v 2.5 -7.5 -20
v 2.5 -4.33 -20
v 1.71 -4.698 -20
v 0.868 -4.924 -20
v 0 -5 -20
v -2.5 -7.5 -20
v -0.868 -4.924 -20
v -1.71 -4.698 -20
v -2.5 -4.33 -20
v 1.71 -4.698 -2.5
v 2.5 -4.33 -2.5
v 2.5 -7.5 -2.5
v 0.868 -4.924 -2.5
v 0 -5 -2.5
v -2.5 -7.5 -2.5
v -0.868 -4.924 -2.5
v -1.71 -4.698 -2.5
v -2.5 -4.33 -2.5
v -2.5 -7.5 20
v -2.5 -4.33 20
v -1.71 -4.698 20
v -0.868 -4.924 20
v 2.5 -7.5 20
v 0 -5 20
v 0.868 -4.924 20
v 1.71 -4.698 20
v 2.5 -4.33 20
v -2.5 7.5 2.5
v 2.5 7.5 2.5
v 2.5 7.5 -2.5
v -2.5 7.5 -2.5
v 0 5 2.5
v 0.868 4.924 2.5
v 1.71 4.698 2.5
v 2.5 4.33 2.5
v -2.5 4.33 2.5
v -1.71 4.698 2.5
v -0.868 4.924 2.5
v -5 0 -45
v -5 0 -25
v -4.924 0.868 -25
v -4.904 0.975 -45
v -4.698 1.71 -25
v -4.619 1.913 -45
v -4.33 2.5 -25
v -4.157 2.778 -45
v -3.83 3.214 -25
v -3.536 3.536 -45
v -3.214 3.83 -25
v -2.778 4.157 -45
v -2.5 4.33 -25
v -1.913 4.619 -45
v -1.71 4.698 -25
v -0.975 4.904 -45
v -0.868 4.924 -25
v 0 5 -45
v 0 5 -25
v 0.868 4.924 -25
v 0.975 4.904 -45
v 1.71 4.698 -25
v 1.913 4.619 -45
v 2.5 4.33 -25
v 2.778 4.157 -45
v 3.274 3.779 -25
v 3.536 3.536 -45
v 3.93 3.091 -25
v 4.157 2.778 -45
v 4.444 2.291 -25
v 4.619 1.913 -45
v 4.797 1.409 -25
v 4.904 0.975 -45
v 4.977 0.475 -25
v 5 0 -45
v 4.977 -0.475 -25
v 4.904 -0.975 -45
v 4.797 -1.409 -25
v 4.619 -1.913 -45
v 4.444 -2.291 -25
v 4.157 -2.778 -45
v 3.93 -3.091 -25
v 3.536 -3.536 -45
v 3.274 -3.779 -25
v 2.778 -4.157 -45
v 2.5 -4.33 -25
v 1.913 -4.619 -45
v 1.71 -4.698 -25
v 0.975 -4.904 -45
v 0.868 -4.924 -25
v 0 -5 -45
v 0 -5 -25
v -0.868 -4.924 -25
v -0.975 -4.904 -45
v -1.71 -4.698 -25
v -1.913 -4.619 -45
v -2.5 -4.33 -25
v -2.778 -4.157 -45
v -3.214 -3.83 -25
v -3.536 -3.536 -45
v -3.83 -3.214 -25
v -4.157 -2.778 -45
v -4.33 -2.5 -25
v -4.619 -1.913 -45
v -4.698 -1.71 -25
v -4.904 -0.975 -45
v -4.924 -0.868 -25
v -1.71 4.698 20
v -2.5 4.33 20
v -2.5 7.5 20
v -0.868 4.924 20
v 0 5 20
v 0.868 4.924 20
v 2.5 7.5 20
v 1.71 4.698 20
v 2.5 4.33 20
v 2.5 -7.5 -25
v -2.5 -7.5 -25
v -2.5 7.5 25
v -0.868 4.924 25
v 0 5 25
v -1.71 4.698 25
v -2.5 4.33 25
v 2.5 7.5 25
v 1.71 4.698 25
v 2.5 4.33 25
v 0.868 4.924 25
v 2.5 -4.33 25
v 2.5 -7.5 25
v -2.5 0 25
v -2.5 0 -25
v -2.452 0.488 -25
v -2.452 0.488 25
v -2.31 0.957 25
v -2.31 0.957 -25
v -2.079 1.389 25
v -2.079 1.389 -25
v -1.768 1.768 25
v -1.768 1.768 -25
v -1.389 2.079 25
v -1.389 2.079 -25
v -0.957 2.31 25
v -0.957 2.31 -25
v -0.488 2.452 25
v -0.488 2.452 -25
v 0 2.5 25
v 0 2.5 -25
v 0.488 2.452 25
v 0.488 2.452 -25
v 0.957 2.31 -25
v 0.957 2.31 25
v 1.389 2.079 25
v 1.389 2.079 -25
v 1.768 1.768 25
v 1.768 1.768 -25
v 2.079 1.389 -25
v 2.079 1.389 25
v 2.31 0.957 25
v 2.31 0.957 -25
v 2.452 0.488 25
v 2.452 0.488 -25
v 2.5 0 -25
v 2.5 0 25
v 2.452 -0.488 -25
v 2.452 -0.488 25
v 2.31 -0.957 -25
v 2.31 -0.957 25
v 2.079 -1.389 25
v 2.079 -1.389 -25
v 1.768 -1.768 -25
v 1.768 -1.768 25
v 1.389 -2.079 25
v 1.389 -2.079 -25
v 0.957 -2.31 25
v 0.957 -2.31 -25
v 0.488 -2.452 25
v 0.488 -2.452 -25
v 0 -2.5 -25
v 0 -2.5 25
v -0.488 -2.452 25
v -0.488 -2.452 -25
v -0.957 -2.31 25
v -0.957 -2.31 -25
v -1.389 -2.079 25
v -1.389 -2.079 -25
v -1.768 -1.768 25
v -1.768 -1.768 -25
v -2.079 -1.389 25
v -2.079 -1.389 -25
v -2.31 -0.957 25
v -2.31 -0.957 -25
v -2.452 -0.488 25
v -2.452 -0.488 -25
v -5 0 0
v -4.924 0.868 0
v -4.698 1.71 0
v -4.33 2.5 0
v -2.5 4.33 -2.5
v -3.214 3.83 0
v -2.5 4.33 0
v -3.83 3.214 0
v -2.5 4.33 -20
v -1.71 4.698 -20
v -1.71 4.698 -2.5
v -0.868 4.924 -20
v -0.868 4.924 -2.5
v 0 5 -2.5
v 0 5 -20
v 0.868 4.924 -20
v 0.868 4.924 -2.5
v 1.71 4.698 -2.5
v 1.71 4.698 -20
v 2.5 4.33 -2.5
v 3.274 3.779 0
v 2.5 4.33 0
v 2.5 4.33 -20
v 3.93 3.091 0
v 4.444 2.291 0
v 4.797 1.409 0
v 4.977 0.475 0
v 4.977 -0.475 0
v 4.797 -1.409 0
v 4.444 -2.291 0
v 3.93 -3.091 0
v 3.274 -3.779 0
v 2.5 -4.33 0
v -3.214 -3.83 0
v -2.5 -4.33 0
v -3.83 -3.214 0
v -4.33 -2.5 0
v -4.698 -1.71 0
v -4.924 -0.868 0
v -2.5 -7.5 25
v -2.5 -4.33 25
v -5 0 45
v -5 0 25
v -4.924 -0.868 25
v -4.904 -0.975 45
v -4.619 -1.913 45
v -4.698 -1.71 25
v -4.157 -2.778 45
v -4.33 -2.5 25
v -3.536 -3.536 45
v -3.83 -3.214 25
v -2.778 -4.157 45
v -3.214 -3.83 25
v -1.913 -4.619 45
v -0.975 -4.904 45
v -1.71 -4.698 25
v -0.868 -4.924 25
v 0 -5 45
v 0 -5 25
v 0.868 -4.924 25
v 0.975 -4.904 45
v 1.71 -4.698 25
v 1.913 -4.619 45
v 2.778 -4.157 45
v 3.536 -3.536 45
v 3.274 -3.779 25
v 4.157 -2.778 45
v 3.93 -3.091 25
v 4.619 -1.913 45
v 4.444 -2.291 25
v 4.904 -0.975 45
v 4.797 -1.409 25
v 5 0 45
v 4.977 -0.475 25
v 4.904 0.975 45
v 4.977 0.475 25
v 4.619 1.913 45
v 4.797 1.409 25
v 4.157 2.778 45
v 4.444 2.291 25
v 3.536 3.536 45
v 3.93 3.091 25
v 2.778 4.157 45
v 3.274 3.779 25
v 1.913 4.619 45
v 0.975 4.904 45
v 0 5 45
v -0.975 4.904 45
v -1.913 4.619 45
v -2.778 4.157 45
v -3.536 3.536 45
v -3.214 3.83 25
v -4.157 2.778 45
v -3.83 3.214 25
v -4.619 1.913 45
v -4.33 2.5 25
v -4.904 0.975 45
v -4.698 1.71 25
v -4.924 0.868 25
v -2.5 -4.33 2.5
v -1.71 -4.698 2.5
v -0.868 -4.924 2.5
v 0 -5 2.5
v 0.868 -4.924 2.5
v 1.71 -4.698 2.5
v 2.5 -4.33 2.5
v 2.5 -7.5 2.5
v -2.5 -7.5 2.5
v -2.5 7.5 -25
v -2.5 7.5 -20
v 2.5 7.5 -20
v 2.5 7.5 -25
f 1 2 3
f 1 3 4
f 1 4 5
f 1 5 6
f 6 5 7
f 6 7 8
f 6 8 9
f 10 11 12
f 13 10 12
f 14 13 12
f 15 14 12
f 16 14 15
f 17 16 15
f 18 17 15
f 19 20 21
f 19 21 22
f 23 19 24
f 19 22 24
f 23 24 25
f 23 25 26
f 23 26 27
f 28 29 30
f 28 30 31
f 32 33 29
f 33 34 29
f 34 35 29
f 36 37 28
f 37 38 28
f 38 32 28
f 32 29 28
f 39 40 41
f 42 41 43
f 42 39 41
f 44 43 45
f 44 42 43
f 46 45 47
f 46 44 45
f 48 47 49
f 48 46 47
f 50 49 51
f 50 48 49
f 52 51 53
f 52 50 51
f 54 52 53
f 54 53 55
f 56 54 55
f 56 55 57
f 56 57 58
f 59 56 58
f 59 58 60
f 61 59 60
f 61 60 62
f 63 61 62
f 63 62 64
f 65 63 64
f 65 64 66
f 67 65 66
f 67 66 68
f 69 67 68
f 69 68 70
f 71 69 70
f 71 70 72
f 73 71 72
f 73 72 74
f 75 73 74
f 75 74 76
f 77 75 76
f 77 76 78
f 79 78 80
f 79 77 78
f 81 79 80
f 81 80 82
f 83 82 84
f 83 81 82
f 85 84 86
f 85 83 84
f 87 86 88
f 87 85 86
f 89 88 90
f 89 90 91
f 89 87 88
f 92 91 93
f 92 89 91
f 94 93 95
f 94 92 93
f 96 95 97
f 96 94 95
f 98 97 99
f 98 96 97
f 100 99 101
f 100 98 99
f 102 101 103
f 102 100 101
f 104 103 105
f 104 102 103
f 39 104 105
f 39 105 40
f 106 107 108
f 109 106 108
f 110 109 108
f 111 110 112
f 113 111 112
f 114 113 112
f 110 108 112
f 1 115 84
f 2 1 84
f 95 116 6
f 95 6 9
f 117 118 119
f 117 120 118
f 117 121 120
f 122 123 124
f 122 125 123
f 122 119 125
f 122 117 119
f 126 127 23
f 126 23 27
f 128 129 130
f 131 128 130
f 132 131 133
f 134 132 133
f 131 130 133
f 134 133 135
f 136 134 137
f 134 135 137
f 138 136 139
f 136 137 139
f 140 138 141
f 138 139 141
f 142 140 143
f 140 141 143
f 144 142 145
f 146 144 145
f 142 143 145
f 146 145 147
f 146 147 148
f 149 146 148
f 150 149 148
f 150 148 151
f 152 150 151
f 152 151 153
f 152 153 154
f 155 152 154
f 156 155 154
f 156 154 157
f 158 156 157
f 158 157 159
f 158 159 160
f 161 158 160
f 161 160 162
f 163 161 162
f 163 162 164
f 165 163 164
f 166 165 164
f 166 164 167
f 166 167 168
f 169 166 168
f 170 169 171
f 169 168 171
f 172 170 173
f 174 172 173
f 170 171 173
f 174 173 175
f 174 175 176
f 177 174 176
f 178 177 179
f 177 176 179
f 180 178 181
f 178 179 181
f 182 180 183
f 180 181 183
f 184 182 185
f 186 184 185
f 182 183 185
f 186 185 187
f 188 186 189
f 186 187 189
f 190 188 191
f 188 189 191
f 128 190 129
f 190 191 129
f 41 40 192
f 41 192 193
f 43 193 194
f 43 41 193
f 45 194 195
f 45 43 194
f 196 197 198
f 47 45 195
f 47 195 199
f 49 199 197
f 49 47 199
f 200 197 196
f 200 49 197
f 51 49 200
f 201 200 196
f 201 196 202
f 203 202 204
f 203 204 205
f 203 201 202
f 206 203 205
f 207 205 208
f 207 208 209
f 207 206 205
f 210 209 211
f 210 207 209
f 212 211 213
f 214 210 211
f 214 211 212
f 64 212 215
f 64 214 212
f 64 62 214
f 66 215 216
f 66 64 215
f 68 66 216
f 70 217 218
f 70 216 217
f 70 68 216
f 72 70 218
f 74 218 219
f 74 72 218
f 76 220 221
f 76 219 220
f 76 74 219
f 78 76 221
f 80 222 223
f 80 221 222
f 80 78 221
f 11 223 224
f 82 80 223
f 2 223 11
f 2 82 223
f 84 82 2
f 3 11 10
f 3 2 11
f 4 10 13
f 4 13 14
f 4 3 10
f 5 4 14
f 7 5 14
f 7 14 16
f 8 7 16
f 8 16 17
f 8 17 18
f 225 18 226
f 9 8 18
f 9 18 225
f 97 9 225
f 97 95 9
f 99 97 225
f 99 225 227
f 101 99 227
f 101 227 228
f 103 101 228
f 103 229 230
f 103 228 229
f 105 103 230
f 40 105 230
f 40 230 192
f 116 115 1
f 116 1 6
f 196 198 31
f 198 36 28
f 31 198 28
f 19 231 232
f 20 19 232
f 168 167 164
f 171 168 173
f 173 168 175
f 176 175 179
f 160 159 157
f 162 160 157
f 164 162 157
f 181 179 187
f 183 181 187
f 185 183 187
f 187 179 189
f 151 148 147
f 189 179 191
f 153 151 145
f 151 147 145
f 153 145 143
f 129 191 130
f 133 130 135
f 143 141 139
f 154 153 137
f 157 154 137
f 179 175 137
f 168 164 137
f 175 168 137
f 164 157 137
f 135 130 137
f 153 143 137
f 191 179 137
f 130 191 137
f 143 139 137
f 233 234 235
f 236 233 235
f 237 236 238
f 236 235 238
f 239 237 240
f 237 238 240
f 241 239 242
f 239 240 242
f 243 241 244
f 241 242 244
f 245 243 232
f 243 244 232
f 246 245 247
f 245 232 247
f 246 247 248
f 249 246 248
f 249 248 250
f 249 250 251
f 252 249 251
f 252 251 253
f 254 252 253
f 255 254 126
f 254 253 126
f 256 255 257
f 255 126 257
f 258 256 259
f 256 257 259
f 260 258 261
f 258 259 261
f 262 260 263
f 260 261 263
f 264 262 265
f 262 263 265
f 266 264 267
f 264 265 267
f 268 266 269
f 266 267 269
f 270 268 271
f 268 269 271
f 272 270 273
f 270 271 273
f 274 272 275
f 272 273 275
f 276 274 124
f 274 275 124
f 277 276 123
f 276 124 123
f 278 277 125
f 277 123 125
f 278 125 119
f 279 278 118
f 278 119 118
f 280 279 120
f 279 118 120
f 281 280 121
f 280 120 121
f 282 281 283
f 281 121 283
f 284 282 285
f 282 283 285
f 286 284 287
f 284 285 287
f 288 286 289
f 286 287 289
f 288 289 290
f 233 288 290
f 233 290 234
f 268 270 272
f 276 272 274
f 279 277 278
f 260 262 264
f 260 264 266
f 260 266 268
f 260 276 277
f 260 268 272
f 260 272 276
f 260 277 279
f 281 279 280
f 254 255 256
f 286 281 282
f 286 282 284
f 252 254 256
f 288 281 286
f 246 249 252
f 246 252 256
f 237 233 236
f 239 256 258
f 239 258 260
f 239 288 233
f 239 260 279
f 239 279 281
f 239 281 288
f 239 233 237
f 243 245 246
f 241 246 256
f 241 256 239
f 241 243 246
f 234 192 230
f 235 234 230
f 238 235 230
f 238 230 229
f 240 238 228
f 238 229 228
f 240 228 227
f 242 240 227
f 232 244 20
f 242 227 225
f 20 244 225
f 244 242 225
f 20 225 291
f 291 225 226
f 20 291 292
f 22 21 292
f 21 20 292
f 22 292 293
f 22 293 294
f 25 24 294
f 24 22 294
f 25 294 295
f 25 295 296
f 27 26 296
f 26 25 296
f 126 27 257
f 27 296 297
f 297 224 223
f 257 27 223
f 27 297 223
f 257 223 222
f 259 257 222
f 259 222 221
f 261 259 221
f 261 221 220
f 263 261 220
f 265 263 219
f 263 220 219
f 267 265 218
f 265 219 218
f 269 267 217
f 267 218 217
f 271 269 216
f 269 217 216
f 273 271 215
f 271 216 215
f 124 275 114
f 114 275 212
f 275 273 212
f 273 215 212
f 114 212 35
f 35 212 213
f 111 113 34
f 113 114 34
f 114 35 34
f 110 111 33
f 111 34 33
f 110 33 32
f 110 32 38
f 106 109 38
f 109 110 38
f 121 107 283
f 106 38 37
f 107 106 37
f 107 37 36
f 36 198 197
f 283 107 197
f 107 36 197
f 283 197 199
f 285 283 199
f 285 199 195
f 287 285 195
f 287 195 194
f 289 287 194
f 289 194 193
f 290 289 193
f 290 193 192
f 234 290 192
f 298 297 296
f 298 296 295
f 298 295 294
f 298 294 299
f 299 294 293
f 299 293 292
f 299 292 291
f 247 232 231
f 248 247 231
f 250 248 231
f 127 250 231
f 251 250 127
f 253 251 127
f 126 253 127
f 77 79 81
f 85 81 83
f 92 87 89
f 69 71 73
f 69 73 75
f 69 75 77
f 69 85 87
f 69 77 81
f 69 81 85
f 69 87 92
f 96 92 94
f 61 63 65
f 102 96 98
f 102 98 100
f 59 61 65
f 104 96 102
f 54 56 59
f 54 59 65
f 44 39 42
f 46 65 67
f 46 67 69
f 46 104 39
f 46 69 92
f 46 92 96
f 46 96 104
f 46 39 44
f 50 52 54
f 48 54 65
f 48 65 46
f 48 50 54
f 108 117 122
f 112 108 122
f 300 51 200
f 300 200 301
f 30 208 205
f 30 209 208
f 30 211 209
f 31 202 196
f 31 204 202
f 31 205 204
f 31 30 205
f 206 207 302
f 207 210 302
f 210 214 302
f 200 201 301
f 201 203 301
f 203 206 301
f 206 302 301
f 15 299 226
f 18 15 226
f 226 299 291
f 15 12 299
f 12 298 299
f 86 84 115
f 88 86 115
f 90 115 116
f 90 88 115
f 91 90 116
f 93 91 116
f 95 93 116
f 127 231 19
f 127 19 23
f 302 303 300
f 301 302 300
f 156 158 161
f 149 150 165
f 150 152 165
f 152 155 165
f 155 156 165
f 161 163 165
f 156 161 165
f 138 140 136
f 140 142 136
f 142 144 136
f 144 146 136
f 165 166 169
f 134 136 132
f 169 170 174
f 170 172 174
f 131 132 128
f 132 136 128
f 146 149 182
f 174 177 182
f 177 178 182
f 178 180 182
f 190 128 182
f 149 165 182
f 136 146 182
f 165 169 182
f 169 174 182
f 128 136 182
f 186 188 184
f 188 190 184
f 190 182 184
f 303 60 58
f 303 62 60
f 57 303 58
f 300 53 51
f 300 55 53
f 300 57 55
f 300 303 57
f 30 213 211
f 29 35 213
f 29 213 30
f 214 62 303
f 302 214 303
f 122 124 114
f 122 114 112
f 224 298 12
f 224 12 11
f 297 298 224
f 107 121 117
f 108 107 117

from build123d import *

# Parameters (mm, degrees)
SKETCH1_R             = 5
BOSS_EXTRUDE1_DEPTH   = 25
SKETCH2_W             = 5
SKETCH2_H             = 15
BOSS_EXTRUDE2_DEPTH   = 5
SKETCH3_W             = 5
SKETCH3_H             = 15
BOSS_EXTRUDE3_DEPTH   = 2.5
SKETCH5_W             = 5
SKETCH5_H             = 15
BOSS_EXTRUDE5_DEPTH   = 2.5
BOSS_EXTRUDE6_START   = 25
SKETCH6_R             = 5
BOSS_EXTRUDE6_DEPTH   = 25
SKETCH7_W             = 5
SKETCH7_H             = 15
BOSS_EXTRUDE7_DEPTH   = 5
F_5_0MM_DOWEL_HOLE1_D = 5
BOSS_EXTRUDE8_START   = 20
SKETCH14_R            = 5
BOSS_EXTRUDE8_DEPTH   = 20
SKETCH15_R            = 5
BOSS_EXTRUDE9_DEPTH   = 20


with BuildPart() as part:
    # Sketch1 → Boss-Extrude1 (new body)
    with BuildSketch(Plane.XY):
        with Locations(Location((0, 0, 0), (0, 0, 180))):
            Circle(SKETCH1_R)
    extrude(amount=BOSS_EXTRUDE1_DEPTH)

    # Sketch2 → Boss-Extrude2 (add)
    with BuildSketch(Plane.XY.offset(25)):
        Rectangle(SKETCH2_W, SKETCH2_H)
    extrude(amount=-BOSS_EXTRUDE2_DEPTH)

    # Sketch3 → Boss-Extrude3 (add)
    with BuildSketch(Plane(origin=(0, 0, 0), x_dir=(-1, 0, 0), z_dir=(0, 0, -1))):
        Rectangle(SKETCH3_W, SKETCH3_H)
    extrude(amount=-BOSS_EXTRUDE3_DEPTH)

    # Sketch5 → Boss-Extrude5 (add)
    with BuildSketch(Plane(origin=(0, 0, 0), x_dir=(-1, 0, 0), z_dir=(0, 0, -1))):
        Rectangle(SKETCH5_W, SKETCH5_H)
    extrude(amount=BOSS_EXTRUDE5_DEPTH)

    # Sketch6 → Boss-Extrude6 (add)
    with BuildSketch(Plane(origin=(0, 0, 0), x_dir=(-1, 0, 0), z_dir=(0, 0, -1)).offset(BOSS_EXTRUDE6_START)):
        Circle(SKETCH6_R)
    extrude(amount=-BOSS_EXTRUDE6_DEPTH)

    # Sketch7 → Boss-Extrude7 (add)
    with BuildSketch(Plane(origin=(0, 0, -25), x_dir=(-1, 0, 0), z_dir=(0, 0, -1))):
        Rectangle(SKETCH7_W, SKETCH7_H)
    extrude(amount=-BOSS_EXTRUDE7_DEPTH)

    # Ø5.0mm Dowel Hole1 (through all)
    with Locations(Plane.XY.offset(25)):
        with Locations((0, 0)):
            Hole(F_5_0MM_DOWEL_HOLE1_D / 2)

    # Sketch14 → Boss-Extrude8 (add)
    with BuildSketch(Plane(origin=(0, 0, -25), x_dir=(-1, 0, 0), z_dir=(0, 0, -1)).offset(BOSS_EXTRUDE8_START)):
        Circle(SKETCH14_R)
    extrude(amount=-BOSS_EXTRUDE8_DEPTH)

    # Sketch15 → Boss-Extrude9 (add)
    with BuildSketch(Plane.XY.offset(25)):
        with Locations(Location((0, 0, 0), (0, 0, 180))):
            Circle(SKETCH15_R)
    extrude(amount=BOSS_EXTRUDE9_DEPTH)


solid = part.part
